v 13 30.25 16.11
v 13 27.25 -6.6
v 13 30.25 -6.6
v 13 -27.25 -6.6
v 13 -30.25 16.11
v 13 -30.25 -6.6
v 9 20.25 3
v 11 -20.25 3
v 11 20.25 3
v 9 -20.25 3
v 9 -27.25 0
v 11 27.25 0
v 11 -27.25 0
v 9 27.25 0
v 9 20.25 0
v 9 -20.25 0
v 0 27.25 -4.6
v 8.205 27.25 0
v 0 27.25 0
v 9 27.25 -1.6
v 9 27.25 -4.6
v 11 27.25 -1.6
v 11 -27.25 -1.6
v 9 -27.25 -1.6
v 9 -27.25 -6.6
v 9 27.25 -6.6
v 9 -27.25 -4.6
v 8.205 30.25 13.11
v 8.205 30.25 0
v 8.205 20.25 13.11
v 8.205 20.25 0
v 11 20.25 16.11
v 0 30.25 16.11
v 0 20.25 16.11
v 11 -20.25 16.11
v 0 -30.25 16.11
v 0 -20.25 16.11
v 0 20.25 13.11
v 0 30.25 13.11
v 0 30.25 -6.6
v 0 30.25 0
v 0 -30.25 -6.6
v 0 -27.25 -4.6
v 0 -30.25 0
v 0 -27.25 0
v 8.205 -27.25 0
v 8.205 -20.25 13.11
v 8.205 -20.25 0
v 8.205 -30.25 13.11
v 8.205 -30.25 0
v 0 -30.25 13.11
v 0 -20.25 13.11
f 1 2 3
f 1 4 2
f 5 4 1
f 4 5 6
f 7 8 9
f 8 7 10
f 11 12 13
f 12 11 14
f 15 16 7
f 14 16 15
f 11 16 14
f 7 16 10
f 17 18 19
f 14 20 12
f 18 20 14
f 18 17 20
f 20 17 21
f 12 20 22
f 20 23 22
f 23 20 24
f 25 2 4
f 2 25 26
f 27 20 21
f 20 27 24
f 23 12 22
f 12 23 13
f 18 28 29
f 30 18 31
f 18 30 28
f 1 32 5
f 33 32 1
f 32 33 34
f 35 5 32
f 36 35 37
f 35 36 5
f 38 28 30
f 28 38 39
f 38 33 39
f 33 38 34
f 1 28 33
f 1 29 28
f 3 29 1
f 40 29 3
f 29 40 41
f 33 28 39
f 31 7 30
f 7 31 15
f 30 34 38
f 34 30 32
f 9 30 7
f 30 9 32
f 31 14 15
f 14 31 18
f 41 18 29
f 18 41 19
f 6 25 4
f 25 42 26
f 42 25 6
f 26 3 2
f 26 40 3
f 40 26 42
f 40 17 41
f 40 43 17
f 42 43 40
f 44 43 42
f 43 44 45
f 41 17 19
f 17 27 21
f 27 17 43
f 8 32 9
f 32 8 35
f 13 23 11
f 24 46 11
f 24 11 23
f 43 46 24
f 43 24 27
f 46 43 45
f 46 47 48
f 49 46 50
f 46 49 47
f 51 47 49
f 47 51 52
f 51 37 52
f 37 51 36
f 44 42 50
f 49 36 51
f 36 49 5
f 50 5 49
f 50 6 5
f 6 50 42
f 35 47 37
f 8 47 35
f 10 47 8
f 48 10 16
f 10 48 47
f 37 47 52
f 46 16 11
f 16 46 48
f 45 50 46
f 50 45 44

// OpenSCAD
pcb_width = 22;
pcb_length = 54.5;
pcb_height = 1.6;
pcb_distance_bottom = 3;

plug_width = 16.41;
plug_length = 15.71;
plug_height = 13.11;
plug_excess = 3;

wall_thick = 3;
wall_thin = 2;

case_side();
mirror([0, 1, 0])
case_side();

module case_side() {

ring_depth = 10;

translate([0, pcb_length/2+plug_excess - ring_depth, plug_height])
cube([plug_width/2, ring_depth, wall_thick]);

translate([plug_width/2, pcb_length/2+plug_excess - ring_depth, 0])
cube([wall_thick, ring_depth, wall_thick+plug_height]);

translate([0, pcb_length/2, -pcb_height-pcb_distance_bottom-wall_thin])
cube([pcb_width/2 + wall_thin, plug_excess, pcb_height + pcb_distance_bottom+wall_thin]);

translate([pcb_width/2, 0, -pcb_height]) {
    cube([wall_thin, pcb_length/2, pcb_height]);
    translate([-2, 0, 0]){
        translate([0, 0, pcb_height])
          cube([2+wall_thin,pcb_length/2, wall_thick]);
        translate([0, 0, -pcb_distance_bottom-wall_thin])
        cube([2+wall_thin,pcb_length/2, pcb_distance_bottom+wall_thin]);
    }
}

// thin wall bottom
translate([0, 0, -pcb_height-pcb_distance_bottom-wall_thin])
cube([pcb_width/2, pcb_length/2, wall_thin]);

// thin wall side
color([1, 0, 0])
translate([pcb_width/2, 0, 0])
cube([wall_thin, pcb_length/2 + plug_excess, plug_height + wall_thick]);

}

color([0, 1, 0]) {
 //  pcb();
}

module pcb () {
    translate([-pcb_width/2, -pcb_length/2, -pcb_height]) {
    cube([pcb_width, pcb_length, pcb_height]);
    }

    plug();
    mirror([0, 1, 0]) {
        plug();
    }

    module plug () {
        translate([-(plug_width)*0.5, pcb_length*0.5-plug_length+plug_excess, 0]) {
            cube([plug_width, plug_length, plug_height]);
        }
    }
}
